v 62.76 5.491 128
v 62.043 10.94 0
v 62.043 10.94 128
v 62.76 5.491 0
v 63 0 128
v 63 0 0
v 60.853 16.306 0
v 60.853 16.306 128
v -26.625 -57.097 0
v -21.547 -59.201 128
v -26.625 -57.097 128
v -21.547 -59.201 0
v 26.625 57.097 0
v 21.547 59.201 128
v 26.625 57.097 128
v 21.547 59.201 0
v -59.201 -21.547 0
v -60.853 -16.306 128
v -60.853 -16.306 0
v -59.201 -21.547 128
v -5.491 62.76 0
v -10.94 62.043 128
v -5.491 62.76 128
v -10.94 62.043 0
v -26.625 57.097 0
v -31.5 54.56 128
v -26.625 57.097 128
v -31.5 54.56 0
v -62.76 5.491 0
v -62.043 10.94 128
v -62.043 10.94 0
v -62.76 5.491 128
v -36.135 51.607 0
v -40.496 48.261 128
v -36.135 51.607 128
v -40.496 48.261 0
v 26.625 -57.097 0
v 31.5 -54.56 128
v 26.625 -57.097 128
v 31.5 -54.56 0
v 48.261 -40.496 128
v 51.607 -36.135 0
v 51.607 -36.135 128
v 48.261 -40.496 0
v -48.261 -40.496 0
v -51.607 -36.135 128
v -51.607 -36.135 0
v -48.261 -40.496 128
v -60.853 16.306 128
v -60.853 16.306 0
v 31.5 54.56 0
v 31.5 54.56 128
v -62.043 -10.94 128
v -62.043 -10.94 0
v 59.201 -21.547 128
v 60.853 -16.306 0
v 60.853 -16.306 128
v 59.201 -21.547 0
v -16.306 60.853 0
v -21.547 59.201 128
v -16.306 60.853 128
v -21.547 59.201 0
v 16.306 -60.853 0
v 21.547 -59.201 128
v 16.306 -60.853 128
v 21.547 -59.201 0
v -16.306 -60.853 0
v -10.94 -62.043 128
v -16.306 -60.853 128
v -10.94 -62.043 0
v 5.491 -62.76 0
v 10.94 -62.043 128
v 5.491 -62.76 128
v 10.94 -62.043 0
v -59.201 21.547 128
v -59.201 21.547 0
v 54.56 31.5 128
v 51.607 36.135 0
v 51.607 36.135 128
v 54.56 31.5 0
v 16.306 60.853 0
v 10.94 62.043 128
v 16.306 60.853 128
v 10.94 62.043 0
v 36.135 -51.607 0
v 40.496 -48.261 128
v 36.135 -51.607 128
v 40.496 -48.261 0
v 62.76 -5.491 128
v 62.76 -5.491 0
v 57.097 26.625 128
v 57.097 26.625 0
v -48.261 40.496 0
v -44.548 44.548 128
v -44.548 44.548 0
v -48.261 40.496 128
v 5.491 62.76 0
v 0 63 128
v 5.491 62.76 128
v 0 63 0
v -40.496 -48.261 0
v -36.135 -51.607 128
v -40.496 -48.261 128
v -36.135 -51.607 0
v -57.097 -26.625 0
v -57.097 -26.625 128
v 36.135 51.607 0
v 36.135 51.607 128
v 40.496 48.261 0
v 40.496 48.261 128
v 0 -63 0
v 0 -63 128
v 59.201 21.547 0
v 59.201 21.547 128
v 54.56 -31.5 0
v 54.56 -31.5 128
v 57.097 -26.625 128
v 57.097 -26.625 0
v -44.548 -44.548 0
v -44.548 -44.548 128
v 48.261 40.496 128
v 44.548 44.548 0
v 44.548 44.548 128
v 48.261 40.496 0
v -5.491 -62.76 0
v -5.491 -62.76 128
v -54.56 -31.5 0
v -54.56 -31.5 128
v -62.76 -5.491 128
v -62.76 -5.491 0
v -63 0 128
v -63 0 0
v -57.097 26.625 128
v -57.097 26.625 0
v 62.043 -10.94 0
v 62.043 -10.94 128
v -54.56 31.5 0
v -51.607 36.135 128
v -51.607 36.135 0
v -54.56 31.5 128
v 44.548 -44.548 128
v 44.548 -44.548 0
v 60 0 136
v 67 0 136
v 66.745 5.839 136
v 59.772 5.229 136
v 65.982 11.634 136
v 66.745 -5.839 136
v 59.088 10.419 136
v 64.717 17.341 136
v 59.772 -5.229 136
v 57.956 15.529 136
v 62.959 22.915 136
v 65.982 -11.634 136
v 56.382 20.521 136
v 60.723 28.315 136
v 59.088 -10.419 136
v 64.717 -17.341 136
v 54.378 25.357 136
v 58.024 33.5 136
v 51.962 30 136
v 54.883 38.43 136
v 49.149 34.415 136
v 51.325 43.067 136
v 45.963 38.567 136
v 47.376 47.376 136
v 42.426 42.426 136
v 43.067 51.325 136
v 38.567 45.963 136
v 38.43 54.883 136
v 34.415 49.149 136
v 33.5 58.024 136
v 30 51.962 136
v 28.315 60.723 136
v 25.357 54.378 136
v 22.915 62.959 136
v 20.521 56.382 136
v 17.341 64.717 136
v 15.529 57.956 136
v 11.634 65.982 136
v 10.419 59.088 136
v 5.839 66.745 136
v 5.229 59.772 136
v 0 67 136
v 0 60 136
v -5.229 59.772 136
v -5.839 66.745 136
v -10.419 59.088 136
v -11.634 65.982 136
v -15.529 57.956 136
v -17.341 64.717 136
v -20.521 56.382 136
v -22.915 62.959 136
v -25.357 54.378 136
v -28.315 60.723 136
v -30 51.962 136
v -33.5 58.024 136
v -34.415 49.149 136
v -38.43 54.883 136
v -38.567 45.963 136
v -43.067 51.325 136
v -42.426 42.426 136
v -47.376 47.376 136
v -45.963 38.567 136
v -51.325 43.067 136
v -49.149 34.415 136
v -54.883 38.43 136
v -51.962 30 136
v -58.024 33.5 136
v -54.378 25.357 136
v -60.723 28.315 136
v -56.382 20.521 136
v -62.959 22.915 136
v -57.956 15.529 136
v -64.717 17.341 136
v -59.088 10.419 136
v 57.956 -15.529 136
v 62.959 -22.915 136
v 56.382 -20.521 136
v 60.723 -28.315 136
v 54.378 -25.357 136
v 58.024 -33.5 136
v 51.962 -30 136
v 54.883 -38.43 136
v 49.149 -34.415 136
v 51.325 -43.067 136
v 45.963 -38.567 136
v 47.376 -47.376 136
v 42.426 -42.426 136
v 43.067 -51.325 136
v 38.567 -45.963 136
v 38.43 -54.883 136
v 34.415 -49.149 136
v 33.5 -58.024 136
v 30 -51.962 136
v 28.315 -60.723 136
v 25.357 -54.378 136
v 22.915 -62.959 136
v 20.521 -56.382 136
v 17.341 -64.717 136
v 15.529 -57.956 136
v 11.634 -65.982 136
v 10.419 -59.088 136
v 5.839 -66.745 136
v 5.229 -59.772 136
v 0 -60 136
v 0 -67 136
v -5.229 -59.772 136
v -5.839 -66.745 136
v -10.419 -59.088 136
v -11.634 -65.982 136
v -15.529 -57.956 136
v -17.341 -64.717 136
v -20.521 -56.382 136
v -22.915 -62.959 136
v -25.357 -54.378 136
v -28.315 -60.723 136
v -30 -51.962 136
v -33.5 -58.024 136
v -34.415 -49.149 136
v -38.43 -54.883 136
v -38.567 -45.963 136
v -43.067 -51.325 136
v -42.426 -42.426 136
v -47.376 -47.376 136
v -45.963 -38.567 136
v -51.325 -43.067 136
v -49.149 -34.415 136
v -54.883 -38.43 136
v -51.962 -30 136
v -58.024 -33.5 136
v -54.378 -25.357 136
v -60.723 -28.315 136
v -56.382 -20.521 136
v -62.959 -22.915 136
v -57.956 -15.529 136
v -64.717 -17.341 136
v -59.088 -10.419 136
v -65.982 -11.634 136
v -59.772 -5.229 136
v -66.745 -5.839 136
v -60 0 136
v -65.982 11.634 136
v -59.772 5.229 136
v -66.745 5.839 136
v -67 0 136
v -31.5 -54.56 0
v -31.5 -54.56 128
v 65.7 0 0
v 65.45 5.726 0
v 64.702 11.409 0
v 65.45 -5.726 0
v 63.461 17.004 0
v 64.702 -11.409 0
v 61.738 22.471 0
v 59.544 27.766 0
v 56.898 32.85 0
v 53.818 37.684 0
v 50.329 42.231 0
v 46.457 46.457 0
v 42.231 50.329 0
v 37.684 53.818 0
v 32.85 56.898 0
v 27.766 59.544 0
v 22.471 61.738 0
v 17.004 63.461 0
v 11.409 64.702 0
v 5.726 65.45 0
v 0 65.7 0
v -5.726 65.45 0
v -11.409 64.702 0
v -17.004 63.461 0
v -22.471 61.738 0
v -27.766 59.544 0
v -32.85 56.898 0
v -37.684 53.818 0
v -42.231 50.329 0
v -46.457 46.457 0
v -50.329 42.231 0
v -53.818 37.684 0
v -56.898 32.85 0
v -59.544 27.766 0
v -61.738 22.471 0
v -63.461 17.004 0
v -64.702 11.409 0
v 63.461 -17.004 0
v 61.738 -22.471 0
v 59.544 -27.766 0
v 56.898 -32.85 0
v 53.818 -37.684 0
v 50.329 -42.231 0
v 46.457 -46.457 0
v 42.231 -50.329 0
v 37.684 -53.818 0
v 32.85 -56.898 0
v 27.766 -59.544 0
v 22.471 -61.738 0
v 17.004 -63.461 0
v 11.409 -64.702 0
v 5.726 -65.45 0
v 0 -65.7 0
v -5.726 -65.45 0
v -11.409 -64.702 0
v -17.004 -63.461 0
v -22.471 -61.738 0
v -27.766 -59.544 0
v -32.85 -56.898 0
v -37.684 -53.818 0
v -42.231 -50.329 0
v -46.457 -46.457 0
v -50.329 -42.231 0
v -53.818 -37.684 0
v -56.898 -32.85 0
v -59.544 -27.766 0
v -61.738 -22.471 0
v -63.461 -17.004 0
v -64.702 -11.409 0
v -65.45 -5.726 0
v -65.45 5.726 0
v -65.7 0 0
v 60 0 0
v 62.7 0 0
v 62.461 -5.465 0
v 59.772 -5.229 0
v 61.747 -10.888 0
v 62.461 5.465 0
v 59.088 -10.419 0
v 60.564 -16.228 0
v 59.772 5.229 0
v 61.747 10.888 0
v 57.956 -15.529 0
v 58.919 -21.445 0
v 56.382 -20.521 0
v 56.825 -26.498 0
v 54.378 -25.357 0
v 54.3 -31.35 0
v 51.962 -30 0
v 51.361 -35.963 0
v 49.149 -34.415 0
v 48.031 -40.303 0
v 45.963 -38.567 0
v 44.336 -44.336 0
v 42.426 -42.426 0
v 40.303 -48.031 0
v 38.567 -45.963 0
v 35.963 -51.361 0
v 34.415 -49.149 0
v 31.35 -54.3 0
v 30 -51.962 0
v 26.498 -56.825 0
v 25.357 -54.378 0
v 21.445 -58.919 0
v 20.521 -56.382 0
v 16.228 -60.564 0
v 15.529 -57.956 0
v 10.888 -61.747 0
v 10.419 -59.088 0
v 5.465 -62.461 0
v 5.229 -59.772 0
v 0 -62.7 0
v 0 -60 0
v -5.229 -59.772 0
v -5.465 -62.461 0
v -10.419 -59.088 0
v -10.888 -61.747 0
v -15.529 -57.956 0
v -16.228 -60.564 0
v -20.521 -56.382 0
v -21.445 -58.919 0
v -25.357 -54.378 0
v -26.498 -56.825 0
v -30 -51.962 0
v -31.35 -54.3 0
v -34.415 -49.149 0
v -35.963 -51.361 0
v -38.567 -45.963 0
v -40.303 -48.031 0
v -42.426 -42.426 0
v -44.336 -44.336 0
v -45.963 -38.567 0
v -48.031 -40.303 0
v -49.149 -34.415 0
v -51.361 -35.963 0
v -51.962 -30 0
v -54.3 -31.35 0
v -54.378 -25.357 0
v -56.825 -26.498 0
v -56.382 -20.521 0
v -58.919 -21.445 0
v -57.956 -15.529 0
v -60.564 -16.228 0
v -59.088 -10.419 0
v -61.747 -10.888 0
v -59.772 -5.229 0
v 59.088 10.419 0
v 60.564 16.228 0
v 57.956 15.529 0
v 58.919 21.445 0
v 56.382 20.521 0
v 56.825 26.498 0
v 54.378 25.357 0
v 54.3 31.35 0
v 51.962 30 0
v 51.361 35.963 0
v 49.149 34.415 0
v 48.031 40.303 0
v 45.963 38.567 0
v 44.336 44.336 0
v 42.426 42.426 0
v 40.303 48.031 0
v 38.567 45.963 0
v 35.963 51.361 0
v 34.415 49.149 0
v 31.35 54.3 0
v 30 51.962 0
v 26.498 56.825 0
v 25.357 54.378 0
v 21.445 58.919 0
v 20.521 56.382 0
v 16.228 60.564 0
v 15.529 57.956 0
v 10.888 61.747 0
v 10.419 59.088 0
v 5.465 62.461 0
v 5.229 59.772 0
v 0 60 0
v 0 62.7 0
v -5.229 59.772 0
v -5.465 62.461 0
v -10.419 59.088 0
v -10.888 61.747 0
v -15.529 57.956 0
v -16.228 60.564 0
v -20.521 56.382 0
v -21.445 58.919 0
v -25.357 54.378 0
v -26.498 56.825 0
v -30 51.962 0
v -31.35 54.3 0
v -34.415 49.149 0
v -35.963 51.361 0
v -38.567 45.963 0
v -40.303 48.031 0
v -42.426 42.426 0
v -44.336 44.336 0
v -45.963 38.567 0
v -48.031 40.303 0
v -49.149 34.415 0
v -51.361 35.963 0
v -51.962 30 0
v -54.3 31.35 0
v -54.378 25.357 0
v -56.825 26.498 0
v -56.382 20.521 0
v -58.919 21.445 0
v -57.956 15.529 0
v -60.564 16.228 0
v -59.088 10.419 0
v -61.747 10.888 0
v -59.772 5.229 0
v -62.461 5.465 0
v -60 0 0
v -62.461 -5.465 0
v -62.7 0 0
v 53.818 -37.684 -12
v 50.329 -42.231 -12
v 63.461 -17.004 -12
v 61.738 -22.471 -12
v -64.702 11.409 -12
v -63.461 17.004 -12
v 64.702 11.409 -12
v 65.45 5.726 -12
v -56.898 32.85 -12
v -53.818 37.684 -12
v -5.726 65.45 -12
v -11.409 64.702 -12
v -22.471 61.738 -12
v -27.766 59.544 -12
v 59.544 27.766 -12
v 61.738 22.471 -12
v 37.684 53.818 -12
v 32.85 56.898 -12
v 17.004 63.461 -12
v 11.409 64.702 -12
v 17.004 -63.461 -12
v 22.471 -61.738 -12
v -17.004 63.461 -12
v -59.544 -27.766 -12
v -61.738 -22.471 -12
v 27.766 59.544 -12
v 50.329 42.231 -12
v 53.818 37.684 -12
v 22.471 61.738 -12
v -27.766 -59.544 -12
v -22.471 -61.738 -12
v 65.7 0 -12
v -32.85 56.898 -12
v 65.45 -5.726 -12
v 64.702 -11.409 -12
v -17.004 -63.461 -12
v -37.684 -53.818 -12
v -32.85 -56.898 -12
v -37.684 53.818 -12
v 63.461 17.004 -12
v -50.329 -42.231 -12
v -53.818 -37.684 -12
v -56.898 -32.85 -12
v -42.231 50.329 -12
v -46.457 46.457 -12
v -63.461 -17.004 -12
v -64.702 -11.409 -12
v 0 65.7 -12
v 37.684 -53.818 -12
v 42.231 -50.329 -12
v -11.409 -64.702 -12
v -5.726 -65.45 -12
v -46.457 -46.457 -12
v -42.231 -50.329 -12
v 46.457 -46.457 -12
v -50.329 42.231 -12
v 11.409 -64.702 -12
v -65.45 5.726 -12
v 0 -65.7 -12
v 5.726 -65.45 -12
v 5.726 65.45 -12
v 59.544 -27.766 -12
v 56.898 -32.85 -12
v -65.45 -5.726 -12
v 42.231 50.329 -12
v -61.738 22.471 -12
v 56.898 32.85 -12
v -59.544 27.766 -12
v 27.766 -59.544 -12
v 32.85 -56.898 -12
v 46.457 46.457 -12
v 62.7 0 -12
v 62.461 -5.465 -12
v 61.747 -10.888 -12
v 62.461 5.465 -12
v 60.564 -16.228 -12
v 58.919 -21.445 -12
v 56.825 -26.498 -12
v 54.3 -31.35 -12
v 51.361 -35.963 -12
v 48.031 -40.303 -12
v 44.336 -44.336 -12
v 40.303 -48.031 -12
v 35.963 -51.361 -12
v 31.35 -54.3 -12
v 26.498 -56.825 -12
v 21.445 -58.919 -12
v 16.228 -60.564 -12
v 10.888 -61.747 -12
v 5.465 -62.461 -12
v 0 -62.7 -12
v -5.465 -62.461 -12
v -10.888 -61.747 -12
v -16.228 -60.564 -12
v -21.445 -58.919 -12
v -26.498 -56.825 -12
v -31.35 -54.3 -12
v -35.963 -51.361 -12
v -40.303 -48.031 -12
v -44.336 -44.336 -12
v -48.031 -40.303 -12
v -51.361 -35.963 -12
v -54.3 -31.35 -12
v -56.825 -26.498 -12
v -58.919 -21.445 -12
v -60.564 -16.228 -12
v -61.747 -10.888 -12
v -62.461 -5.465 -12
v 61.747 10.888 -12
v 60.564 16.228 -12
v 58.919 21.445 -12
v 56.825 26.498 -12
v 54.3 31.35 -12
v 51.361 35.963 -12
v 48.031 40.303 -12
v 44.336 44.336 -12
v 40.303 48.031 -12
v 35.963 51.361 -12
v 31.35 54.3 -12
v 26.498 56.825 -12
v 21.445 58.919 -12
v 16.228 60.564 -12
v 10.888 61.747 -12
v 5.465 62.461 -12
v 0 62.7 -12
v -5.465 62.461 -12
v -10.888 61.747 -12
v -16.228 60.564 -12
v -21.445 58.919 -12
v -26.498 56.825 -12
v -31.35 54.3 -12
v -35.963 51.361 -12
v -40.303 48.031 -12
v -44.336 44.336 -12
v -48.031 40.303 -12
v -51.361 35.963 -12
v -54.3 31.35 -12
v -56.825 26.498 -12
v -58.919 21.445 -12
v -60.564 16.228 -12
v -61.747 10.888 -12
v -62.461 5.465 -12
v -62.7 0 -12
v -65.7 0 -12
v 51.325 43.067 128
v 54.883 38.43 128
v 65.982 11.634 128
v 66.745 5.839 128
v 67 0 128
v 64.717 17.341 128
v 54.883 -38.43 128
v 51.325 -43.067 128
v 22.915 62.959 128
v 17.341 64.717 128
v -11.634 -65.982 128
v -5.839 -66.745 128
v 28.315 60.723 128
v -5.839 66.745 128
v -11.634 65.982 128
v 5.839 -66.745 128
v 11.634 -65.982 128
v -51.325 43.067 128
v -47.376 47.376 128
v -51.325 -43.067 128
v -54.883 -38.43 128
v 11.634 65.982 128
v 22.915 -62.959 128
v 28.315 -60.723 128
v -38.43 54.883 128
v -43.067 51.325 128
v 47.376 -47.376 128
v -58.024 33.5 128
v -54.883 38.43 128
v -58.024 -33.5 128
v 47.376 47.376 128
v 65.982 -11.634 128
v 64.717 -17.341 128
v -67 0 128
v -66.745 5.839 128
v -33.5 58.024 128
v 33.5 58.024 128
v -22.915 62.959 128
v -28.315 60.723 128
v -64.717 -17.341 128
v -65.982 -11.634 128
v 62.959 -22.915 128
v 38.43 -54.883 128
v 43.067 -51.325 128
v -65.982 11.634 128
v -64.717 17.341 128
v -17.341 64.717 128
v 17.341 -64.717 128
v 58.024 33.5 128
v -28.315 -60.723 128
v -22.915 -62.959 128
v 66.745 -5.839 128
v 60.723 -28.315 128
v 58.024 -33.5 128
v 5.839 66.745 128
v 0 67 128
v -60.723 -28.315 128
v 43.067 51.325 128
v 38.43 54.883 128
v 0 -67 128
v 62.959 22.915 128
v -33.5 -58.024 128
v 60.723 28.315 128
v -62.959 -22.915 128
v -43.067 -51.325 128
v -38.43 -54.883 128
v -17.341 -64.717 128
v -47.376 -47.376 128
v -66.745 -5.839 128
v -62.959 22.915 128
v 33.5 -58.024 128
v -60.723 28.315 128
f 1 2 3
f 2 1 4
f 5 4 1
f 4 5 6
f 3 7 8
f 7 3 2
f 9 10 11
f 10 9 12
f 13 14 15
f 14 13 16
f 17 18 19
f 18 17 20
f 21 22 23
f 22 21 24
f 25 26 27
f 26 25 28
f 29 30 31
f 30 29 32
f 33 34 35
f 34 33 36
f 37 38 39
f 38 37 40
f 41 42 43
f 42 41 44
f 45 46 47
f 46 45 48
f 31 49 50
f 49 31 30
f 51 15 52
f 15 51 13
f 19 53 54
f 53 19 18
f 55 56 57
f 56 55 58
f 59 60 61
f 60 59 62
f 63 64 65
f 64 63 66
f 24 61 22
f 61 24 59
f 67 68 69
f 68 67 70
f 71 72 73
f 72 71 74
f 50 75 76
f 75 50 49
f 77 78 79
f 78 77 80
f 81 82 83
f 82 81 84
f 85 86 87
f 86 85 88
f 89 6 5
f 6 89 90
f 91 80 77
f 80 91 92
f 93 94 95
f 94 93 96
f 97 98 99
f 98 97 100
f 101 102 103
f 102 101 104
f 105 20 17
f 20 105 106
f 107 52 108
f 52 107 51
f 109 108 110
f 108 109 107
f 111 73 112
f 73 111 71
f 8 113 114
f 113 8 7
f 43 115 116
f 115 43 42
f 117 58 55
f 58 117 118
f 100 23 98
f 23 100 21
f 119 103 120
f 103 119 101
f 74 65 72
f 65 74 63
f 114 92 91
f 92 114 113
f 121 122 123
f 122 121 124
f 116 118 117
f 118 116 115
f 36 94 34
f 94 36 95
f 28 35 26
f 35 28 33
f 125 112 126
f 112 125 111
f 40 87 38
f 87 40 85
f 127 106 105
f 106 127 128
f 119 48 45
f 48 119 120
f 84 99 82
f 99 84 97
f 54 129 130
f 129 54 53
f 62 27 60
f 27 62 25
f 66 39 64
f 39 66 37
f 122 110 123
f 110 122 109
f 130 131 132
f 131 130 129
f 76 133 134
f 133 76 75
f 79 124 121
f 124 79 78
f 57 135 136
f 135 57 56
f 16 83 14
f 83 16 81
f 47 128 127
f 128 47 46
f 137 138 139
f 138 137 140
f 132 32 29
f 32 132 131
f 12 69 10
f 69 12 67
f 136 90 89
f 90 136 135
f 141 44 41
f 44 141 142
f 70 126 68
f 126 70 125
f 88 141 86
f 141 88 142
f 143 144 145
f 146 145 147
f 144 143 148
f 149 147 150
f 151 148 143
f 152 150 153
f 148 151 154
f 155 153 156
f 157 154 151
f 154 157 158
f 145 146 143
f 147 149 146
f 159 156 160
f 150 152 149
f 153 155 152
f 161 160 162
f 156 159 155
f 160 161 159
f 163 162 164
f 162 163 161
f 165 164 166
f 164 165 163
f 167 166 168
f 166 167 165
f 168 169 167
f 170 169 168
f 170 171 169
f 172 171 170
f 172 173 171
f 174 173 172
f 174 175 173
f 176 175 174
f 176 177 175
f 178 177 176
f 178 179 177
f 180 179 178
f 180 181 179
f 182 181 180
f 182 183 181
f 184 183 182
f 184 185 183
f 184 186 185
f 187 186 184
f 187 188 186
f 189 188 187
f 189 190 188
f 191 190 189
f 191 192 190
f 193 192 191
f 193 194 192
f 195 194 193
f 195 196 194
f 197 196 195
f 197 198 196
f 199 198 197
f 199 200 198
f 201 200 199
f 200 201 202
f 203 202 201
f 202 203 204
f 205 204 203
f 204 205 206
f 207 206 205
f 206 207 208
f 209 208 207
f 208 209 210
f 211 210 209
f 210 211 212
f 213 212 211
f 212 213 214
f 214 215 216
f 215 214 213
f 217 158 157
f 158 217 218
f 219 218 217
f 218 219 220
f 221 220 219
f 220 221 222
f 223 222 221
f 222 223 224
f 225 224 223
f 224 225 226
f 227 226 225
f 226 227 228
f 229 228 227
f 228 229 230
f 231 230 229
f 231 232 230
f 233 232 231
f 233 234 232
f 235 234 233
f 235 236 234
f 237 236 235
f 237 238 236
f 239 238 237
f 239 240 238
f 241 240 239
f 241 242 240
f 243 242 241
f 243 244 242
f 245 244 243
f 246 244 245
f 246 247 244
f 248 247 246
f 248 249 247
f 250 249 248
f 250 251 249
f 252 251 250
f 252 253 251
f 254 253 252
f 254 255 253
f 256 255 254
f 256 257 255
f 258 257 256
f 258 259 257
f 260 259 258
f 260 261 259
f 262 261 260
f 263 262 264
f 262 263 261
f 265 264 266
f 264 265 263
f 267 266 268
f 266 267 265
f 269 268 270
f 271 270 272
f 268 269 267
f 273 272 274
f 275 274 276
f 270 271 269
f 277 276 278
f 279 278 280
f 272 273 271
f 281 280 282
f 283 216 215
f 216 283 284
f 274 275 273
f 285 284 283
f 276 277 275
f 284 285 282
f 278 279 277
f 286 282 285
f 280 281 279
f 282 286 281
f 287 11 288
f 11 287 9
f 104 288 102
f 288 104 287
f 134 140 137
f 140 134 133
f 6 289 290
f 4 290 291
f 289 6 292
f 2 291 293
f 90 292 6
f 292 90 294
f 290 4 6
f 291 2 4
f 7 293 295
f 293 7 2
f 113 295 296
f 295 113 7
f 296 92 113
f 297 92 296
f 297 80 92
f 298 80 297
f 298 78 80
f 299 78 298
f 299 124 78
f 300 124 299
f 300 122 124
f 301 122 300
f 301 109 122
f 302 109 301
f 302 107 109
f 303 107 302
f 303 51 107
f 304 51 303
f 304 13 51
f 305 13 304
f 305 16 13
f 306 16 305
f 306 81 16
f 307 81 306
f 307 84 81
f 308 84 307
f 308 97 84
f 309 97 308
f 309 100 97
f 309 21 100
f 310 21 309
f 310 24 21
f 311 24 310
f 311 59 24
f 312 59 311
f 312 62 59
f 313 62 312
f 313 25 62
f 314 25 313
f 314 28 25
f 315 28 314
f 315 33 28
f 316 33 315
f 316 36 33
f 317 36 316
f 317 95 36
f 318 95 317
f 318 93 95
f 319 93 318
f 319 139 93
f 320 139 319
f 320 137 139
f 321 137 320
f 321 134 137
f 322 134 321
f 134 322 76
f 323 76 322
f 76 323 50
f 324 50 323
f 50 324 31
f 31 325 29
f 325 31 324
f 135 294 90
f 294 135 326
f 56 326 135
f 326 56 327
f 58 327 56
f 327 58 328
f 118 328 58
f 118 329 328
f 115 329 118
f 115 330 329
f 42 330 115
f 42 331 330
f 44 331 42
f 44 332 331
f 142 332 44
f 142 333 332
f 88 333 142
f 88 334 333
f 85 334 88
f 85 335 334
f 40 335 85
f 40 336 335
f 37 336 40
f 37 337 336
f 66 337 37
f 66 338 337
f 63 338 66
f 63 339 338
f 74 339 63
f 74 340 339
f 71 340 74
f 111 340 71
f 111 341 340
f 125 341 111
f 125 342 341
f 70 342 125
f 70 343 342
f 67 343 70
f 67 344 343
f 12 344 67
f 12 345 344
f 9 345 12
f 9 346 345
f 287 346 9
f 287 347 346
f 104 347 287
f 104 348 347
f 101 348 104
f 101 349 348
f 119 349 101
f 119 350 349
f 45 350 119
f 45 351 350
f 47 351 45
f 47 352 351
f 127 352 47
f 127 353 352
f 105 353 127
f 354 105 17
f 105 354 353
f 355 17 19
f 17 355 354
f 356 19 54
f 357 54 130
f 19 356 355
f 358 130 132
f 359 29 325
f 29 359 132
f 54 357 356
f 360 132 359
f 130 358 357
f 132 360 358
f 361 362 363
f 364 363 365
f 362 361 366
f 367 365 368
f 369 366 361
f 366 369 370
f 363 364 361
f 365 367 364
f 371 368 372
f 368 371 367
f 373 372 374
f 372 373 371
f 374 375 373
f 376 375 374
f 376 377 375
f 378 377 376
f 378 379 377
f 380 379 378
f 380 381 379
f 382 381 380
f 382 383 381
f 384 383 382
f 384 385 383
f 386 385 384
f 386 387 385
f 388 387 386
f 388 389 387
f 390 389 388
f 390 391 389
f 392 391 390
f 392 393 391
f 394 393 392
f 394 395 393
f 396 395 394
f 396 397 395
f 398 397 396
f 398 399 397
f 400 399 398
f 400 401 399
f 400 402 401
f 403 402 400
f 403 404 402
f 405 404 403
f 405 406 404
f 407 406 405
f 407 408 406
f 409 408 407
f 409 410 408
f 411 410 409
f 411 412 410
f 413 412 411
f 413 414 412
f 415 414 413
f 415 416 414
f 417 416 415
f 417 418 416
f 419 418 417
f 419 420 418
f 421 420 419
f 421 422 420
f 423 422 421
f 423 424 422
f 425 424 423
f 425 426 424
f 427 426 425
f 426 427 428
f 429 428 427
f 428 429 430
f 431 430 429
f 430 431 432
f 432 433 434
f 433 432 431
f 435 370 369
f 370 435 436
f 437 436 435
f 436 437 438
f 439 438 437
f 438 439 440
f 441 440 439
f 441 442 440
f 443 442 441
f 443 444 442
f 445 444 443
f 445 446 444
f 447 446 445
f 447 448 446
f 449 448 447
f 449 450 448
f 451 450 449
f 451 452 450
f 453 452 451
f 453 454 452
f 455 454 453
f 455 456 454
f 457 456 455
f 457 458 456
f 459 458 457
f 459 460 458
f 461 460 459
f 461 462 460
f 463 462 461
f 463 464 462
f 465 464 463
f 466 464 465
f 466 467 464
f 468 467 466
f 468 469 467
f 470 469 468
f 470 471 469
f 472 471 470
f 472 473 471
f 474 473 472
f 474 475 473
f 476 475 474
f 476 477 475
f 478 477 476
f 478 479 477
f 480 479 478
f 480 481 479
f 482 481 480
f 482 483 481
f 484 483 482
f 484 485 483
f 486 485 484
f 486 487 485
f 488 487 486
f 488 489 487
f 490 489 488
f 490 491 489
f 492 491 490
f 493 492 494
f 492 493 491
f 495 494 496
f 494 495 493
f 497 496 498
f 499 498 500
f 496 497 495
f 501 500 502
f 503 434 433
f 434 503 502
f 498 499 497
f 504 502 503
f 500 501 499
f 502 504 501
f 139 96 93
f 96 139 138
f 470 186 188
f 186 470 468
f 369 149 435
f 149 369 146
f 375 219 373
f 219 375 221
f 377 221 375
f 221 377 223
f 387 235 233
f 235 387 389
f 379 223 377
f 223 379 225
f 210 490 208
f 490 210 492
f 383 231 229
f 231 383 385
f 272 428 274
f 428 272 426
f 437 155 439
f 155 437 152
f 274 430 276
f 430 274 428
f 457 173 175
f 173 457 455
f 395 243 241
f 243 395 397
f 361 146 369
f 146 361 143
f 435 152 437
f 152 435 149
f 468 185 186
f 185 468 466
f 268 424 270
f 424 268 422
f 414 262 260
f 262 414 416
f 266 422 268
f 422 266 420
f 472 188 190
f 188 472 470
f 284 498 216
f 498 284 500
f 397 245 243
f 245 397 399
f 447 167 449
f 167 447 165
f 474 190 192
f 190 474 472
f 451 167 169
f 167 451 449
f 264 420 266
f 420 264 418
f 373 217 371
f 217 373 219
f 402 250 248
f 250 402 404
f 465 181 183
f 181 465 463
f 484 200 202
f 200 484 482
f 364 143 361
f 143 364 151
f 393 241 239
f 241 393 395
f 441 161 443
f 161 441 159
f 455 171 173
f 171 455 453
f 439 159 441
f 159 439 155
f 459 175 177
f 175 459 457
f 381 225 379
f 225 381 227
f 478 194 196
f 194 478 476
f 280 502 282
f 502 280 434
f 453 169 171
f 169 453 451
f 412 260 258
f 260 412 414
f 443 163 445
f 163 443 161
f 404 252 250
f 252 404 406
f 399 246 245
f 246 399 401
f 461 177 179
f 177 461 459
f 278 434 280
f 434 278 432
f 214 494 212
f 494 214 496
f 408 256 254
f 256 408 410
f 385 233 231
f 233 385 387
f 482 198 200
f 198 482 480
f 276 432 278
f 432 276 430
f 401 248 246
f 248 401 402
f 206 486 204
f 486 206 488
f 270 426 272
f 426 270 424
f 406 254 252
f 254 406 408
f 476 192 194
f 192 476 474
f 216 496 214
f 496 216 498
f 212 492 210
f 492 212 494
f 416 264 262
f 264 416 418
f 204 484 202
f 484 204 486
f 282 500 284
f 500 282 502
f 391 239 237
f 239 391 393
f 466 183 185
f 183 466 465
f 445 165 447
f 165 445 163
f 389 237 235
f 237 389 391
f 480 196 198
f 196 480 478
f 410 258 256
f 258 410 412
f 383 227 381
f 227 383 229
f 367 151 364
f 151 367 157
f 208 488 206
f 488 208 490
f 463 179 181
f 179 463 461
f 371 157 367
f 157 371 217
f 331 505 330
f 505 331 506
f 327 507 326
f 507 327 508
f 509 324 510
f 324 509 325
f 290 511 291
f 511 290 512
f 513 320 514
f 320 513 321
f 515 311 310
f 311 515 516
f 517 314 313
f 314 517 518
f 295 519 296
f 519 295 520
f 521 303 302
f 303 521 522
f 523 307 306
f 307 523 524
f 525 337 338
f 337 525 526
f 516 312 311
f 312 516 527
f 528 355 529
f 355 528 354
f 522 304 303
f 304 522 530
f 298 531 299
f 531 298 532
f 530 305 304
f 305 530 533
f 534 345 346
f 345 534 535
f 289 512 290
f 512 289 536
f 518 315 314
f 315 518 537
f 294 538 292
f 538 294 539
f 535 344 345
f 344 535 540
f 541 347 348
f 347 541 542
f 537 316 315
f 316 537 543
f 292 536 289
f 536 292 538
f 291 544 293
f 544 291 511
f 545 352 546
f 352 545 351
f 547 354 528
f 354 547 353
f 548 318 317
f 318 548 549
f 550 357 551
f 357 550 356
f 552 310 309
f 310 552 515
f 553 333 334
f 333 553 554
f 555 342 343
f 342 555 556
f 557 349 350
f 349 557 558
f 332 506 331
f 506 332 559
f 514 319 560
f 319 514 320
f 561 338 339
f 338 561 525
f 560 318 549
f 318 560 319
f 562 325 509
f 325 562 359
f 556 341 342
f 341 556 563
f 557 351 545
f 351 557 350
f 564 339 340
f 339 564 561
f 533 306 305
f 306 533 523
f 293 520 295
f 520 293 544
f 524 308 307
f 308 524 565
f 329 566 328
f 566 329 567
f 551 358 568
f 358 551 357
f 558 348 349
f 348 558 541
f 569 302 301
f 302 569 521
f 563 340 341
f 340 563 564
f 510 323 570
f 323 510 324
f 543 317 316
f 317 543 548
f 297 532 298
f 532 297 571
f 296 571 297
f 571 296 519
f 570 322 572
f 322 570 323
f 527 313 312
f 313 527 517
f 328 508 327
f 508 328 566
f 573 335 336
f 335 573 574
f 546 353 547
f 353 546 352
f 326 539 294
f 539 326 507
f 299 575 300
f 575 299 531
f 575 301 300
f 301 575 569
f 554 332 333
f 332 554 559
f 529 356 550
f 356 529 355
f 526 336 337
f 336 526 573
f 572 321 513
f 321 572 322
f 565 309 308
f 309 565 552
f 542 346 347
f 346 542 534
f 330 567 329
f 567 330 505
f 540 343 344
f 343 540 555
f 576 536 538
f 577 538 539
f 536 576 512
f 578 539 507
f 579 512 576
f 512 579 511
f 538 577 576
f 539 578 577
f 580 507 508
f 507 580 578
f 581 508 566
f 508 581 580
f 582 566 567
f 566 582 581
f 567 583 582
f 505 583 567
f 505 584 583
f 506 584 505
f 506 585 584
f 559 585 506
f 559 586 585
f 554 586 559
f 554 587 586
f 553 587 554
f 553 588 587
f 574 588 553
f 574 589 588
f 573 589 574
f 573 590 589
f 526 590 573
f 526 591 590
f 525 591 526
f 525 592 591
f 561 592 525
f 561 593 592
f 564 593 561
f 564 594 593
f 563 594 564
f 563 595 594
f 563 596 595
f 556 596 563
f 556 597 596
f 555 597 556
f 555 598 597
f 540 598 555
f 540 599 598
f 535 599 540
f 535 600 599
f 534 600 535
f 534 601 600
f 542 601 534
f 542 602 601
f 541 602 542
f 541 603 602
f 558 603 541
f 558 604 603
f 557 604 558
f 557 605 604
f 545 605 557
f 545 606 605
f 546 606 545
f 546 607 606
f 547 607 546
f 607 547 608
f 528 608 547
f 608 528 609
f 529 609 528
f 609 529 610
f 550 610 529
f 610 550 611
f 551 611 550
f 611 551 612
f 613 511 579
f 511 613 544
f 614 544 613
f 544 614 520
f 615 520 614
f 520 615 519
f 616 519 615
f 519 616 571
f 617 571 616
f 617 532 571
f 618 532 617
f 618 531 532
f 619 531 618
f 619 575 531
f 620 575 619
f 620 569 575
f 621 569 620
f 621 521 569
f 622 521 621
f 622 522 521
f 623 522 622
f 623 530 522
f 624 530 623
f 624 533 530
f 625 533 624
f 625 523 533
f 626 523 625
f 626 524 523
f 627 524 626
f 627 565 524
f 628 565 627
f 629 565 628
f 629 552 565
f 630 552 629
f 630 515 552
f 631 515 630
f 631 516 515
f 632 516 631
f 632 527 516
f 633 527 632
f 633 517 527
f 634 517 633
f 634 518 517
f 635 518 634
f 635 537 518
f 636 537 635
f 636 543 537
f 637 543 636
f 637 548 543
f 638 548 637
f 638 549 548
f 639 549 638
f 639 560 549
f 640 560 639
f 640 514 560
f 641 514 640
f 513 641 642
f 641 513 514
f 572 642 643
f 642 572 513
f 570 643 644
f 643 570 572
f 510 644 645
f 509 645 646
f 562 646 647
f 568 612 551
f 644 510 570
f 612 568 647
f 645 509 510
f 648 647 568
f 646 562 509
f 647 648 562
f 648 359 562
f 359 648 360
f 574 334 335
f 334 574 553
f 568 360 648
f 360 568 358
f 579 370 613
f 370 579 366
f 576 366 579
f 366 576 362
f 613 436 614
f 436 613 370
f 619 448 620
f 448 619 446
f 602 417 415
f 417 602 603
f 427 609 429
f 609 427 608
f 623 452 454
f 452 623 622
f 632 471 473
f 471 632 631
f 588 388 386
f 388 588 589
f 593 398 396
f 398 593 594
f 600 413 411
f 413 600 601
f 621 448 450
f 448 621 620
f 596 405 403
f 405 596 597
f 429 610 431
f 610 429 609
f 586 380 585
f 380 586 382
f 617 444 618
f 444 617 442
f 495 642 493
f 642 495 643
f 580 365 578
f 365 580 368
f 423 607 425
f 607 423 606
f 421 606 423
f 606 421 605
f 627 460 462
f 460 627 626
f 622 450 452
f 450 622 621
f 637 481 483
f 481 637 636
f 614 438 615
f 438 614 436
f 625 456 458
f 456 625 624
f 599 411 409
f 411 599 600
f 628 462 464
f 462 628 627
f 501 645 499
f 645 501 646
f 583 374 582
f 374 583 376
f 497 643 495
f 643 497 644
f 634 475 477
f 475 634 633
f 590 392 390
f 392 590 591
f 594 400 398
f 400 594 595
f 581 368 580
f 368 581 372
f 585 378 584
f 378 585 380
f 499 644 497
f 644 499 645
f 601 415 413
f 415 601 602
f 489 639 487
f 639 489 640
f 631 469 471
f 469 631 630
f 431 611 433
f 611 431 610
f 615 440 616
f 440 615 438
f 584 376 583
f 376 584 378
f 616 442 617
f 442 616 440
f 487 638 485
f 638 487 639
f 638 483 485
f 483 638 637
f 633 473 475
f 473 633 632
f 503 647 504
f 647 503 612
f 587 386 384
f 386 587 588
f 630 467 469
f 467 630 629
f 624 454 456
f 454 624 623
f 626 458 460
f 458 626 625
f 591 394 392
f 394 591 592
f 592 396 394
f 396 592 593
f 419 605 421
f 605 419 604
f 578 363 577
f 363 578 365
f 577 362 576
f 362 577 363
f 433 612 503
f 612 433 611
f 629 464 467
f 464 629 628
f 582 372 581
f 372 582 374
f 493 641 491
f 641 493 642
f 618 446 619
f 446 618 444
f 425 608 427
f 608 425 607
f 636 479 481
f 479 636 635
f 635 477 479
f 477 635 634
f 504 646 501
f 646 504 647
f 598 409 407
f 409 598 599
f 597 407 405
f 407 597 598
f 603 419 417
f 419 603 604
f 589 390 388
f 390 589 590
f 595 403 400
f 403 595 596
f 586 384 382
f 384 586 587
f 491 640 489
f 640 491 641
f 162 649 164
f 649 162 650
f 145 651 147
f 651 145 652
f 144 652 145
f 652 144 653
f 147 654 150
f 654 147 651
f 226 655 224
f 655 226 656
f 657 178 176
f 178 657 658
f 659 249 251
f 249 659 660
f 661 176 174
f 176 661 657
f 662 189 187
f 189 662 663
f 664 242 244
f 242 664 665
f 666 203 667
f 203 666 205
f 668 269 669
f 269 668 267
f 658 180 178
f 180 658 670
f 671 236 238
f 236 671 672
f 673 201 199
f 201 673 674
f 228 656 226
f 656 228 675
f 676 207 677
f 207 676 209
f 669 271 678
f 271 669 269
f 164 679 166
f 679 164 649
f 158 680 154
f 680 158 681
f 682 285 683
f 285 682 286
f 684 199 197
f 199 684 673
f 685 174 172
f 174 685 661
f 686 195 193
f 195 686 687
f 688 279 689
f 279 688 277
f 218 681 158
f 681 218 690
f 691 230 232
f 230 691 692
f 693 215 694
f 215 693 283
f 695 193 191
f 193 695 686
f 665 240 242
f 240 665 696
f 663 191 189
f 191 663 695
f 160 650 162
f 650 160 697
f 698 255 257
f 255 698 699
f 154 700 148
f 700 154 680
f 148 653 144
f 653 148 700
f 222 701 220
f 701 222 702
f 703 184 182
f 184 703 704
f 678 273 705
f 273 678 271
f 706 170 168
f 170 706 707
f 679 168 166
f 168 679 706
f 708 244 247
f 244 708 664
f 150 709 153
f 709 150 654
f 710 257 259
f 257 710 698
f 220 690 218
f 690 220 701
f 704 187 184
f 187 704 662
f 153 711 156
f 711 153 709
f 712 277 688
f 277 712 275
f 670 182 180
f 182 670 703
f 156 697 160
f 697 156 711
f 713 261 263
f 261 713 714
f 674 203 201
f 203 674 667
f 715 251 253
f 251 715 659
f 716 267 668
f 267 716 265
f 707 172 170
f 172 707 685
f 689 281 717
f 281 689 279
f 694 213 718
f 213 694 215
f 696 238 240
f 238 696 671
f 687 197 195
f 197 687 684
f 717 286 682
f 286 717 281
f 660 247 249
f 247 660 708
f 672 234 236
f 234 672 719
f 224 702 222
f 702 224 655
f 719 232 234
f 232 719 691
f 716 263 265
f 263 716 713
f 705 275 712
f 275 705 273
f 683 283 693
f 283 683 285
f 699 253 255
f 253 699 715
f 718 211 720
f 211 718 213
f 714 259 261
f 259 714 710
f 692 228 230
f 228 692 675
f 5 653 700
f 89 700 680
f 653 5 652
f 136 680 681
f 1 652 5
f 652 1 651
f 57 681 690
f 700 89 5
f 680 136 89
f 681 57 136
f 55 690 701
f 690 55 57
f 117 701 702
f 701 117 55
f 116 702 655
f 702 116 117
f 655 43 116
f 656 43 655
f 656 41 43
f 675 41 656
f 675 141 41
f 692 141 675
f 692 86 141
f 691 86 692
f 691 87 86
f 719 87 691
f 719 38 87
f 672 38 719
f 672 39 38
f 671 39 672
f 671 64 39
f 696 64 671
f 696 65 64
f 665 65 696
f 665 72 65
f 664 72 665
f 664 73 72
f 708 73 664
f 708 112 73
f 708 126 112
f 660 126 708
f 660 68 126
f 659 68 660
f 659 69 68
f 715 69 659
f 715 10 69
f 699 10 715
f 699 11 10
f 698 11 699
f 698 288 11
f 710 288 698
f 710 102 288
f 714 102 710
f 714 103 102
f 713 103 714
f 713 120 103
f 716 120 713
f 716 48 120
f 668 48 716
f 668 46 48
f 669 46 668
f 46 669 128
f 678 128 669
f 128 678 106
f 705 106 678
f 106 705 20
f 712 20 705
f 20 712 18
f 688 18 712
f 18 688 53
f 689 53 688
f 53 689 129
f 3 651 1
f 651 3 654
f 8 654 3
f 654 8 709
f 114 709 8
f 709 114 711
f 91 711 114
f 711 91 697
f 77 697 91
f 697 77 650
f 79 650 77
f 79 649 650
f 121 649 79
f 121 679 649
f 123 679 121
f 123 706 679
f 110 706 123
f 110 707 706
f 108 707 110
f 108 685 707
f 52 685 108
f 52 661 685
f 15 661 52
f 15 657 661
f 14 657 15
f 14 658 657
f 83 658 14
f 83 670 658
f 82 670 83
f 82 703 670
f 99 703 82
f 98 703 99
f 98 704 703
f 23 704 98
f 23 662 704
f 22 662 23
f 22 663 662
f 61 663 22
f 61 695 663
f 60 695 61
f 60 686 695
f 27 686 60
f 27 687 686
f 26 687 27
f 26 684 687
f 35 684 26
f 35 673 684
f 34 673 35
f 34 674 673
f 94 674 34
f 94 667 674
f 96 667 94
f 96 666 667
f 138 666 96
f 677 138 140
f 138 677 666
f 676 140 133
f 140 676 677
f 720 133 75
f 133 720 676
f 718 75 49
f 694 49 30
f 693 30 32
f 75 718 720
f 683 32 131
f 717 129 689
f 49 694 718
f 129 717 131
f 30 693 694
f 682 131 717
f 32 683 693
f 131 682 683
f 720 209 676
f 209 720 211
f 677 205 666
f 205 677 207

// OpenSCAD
// edf_120_thrust_tube.scad
// Thrust tube for Serenity Rev N 120mm rear EDF.
//
// Remixed from Thingiverse thing:2838324 (120mm fuselage EDF).
// This tube channels exhaust from the EDF exit face through the
// aft fuselage (station ~440mm) to the rear iris nozzle (station ~600mm).
//
// Coordinate system: +Z = aft (exhaust direction).
// Z=0 = forward face of thrust tube (mates to EDF casing aft lip / motor mount ring).
// Z=TUBE_L = aft bonding face (mates to rear_nozzle_frame.stl base ring).
//
// Integration interfaces:
//   Forward (Z=0):     forward spigot ID = EDF casing OD; locates tube on EDF exit.
//   Aft (Z=TUBE_L):    bonding flange ring bonds to rear_nozzle_frame.stl base.
//
// Station reference (world X coordinates of rear_shell24_2mm_repaired.stl):
//   EDF exhaust face at X ≈ -90 mm (in cargo section, per plenum design).
//   Nozzle frame shoulder at X = -226 mm (= aft face -246 + seat depth 20).
//   Required span: 226 - 90 = 136 mm → TUBE_L = 136 mm.
//
//   Rev B (2026-06-02): corrected TUBE_L from 155 mm to 136 mm.
//   Previous value was 19 mm too long; tube end overshot the nozzle shoulder.
//
// Print: PETG, 0.20mm layers, 20% gyroid infill.
// Note: orient with tube axis vertical on printer for best layer adhesion.
// No support required if printed tube-axis vertical.

// ── Geometry parameters ────────────────────────────────────────────────────

BORE_ID      = 120;   // [mm] internal bore (matches EDF fan bore)
WALL         =   3;   // [mm] tube wall thickness → OD = BORE_ID + 2×WALL
TUBE_L       = 136;   // [mm] total tube length (EDF exhaust X≈-90 to nozzle shoulder X=-226)

// Forward spigot: thin sleeve that slips over the EDF casing aft OD
// The EDF casing outer diameter is nominally ~125mm (varies by brand);
// adjust SPIGOT_ID if your 120mm EDF casing OD differs.
EDF_CASING_OD = 125;  // [mm] EDF casing outer diameter — adjust to match actual unit
SPIGOT_ID     = EDF_CASING_OD + 0.4; // slip-fit clearance
SPIGOT_WALL   =   3;  // [mm] spigot sleeve wall
SPIGOT_L      =  12;  // [mm] spigot engagement length (overlaps EDF casing)

// Aft bonding flange: widens to grip against rear_nozzle_frame.stl base ring.
// rear_nozzle_frame base ring inner bore is assumed ~128mm — verify in slicer.
FLANGE_OD     = 134;  // [mm] bonding flange outer diameter
FLANGE_L      =   8;  // [mm] axial depth of bonding flange

// Lightening slots in tube wall (optional aero/mass reduction — set to 0 to disable)
SLOT_COUNT    =   0;  // number of axial slots in tube wall (0 = solid tube)
SLOT_W        =   8;  // [mm] slot width
SLOT_L        = 100;  // [mm] slot length (centred on tube)

$fn = 72;

// ── Derived values ─────────────────────────────────────────────────────────

TUBE_OD = BORE_ID + 2 * WALL;          // = 126mm
SPIGOT_OD = SPIGOT_ID + 2 * SPIGOT_WALL;

// ── Modules ────────────────────────────────────────────────────────────────

module main_tube() {
    difference() {
        cylinder(h = TUBE_L, r = TUBE_OD / 2);
        // bore
        translate([0, 0, -0.5])
            cylinder(h = TUBE_L + 1, r = BORE_ID / 2);
        // axial lightening slots
        if (SLOT_COUNT > 0)
            for (i = [0 : SLOT_COUNT - 1])
                rotate([0, 0, i * 360 / SLOT_COUNT])
                translate([TUBE_OD / 2 - WALL / 2, 0, TUBE_L / 2])
                    cube([WALL + 1, SLOT_W, SLOT_L], center = true);
    }
}

module forward_spigot() {
    // sleeve at Z=0 end that overlaps EDF casing aft lip
    difference() {
        cylinder(h = SPIGOT_L, r = SPIGOT_OD / 2);
        // inner bore clears EDF casing
        translate([0, 0, -0.5])
            cylinder(h = SPIGOT_L + 1, r = SPIGOT_ID / 2);
    }
}

module aft_bonding_flange() {
    // thickened ring at aft end for epoxy bond to rear_nozzle_frame base ring
    translate([0, 0, TUBE_L - FLANGE_L])
    difference() {
        cylinder(h = FLANGE_L, r = FLANGE_OD / 2);
        translate([0, 0, -0.5])
            cylinder(h = FLANGE_L + 1, r = BORE_ID / 2);
    }
}

// ── Assembly ───────────────────────────────────────────────────────────────

union() {
    main_tube();
    // forward spigot protrudes in the −Z direction (over EDF casing)
    translate([0, 0, -SPIGOT_L])
        forward_spigot();
    aft_bonding_flange();
}
